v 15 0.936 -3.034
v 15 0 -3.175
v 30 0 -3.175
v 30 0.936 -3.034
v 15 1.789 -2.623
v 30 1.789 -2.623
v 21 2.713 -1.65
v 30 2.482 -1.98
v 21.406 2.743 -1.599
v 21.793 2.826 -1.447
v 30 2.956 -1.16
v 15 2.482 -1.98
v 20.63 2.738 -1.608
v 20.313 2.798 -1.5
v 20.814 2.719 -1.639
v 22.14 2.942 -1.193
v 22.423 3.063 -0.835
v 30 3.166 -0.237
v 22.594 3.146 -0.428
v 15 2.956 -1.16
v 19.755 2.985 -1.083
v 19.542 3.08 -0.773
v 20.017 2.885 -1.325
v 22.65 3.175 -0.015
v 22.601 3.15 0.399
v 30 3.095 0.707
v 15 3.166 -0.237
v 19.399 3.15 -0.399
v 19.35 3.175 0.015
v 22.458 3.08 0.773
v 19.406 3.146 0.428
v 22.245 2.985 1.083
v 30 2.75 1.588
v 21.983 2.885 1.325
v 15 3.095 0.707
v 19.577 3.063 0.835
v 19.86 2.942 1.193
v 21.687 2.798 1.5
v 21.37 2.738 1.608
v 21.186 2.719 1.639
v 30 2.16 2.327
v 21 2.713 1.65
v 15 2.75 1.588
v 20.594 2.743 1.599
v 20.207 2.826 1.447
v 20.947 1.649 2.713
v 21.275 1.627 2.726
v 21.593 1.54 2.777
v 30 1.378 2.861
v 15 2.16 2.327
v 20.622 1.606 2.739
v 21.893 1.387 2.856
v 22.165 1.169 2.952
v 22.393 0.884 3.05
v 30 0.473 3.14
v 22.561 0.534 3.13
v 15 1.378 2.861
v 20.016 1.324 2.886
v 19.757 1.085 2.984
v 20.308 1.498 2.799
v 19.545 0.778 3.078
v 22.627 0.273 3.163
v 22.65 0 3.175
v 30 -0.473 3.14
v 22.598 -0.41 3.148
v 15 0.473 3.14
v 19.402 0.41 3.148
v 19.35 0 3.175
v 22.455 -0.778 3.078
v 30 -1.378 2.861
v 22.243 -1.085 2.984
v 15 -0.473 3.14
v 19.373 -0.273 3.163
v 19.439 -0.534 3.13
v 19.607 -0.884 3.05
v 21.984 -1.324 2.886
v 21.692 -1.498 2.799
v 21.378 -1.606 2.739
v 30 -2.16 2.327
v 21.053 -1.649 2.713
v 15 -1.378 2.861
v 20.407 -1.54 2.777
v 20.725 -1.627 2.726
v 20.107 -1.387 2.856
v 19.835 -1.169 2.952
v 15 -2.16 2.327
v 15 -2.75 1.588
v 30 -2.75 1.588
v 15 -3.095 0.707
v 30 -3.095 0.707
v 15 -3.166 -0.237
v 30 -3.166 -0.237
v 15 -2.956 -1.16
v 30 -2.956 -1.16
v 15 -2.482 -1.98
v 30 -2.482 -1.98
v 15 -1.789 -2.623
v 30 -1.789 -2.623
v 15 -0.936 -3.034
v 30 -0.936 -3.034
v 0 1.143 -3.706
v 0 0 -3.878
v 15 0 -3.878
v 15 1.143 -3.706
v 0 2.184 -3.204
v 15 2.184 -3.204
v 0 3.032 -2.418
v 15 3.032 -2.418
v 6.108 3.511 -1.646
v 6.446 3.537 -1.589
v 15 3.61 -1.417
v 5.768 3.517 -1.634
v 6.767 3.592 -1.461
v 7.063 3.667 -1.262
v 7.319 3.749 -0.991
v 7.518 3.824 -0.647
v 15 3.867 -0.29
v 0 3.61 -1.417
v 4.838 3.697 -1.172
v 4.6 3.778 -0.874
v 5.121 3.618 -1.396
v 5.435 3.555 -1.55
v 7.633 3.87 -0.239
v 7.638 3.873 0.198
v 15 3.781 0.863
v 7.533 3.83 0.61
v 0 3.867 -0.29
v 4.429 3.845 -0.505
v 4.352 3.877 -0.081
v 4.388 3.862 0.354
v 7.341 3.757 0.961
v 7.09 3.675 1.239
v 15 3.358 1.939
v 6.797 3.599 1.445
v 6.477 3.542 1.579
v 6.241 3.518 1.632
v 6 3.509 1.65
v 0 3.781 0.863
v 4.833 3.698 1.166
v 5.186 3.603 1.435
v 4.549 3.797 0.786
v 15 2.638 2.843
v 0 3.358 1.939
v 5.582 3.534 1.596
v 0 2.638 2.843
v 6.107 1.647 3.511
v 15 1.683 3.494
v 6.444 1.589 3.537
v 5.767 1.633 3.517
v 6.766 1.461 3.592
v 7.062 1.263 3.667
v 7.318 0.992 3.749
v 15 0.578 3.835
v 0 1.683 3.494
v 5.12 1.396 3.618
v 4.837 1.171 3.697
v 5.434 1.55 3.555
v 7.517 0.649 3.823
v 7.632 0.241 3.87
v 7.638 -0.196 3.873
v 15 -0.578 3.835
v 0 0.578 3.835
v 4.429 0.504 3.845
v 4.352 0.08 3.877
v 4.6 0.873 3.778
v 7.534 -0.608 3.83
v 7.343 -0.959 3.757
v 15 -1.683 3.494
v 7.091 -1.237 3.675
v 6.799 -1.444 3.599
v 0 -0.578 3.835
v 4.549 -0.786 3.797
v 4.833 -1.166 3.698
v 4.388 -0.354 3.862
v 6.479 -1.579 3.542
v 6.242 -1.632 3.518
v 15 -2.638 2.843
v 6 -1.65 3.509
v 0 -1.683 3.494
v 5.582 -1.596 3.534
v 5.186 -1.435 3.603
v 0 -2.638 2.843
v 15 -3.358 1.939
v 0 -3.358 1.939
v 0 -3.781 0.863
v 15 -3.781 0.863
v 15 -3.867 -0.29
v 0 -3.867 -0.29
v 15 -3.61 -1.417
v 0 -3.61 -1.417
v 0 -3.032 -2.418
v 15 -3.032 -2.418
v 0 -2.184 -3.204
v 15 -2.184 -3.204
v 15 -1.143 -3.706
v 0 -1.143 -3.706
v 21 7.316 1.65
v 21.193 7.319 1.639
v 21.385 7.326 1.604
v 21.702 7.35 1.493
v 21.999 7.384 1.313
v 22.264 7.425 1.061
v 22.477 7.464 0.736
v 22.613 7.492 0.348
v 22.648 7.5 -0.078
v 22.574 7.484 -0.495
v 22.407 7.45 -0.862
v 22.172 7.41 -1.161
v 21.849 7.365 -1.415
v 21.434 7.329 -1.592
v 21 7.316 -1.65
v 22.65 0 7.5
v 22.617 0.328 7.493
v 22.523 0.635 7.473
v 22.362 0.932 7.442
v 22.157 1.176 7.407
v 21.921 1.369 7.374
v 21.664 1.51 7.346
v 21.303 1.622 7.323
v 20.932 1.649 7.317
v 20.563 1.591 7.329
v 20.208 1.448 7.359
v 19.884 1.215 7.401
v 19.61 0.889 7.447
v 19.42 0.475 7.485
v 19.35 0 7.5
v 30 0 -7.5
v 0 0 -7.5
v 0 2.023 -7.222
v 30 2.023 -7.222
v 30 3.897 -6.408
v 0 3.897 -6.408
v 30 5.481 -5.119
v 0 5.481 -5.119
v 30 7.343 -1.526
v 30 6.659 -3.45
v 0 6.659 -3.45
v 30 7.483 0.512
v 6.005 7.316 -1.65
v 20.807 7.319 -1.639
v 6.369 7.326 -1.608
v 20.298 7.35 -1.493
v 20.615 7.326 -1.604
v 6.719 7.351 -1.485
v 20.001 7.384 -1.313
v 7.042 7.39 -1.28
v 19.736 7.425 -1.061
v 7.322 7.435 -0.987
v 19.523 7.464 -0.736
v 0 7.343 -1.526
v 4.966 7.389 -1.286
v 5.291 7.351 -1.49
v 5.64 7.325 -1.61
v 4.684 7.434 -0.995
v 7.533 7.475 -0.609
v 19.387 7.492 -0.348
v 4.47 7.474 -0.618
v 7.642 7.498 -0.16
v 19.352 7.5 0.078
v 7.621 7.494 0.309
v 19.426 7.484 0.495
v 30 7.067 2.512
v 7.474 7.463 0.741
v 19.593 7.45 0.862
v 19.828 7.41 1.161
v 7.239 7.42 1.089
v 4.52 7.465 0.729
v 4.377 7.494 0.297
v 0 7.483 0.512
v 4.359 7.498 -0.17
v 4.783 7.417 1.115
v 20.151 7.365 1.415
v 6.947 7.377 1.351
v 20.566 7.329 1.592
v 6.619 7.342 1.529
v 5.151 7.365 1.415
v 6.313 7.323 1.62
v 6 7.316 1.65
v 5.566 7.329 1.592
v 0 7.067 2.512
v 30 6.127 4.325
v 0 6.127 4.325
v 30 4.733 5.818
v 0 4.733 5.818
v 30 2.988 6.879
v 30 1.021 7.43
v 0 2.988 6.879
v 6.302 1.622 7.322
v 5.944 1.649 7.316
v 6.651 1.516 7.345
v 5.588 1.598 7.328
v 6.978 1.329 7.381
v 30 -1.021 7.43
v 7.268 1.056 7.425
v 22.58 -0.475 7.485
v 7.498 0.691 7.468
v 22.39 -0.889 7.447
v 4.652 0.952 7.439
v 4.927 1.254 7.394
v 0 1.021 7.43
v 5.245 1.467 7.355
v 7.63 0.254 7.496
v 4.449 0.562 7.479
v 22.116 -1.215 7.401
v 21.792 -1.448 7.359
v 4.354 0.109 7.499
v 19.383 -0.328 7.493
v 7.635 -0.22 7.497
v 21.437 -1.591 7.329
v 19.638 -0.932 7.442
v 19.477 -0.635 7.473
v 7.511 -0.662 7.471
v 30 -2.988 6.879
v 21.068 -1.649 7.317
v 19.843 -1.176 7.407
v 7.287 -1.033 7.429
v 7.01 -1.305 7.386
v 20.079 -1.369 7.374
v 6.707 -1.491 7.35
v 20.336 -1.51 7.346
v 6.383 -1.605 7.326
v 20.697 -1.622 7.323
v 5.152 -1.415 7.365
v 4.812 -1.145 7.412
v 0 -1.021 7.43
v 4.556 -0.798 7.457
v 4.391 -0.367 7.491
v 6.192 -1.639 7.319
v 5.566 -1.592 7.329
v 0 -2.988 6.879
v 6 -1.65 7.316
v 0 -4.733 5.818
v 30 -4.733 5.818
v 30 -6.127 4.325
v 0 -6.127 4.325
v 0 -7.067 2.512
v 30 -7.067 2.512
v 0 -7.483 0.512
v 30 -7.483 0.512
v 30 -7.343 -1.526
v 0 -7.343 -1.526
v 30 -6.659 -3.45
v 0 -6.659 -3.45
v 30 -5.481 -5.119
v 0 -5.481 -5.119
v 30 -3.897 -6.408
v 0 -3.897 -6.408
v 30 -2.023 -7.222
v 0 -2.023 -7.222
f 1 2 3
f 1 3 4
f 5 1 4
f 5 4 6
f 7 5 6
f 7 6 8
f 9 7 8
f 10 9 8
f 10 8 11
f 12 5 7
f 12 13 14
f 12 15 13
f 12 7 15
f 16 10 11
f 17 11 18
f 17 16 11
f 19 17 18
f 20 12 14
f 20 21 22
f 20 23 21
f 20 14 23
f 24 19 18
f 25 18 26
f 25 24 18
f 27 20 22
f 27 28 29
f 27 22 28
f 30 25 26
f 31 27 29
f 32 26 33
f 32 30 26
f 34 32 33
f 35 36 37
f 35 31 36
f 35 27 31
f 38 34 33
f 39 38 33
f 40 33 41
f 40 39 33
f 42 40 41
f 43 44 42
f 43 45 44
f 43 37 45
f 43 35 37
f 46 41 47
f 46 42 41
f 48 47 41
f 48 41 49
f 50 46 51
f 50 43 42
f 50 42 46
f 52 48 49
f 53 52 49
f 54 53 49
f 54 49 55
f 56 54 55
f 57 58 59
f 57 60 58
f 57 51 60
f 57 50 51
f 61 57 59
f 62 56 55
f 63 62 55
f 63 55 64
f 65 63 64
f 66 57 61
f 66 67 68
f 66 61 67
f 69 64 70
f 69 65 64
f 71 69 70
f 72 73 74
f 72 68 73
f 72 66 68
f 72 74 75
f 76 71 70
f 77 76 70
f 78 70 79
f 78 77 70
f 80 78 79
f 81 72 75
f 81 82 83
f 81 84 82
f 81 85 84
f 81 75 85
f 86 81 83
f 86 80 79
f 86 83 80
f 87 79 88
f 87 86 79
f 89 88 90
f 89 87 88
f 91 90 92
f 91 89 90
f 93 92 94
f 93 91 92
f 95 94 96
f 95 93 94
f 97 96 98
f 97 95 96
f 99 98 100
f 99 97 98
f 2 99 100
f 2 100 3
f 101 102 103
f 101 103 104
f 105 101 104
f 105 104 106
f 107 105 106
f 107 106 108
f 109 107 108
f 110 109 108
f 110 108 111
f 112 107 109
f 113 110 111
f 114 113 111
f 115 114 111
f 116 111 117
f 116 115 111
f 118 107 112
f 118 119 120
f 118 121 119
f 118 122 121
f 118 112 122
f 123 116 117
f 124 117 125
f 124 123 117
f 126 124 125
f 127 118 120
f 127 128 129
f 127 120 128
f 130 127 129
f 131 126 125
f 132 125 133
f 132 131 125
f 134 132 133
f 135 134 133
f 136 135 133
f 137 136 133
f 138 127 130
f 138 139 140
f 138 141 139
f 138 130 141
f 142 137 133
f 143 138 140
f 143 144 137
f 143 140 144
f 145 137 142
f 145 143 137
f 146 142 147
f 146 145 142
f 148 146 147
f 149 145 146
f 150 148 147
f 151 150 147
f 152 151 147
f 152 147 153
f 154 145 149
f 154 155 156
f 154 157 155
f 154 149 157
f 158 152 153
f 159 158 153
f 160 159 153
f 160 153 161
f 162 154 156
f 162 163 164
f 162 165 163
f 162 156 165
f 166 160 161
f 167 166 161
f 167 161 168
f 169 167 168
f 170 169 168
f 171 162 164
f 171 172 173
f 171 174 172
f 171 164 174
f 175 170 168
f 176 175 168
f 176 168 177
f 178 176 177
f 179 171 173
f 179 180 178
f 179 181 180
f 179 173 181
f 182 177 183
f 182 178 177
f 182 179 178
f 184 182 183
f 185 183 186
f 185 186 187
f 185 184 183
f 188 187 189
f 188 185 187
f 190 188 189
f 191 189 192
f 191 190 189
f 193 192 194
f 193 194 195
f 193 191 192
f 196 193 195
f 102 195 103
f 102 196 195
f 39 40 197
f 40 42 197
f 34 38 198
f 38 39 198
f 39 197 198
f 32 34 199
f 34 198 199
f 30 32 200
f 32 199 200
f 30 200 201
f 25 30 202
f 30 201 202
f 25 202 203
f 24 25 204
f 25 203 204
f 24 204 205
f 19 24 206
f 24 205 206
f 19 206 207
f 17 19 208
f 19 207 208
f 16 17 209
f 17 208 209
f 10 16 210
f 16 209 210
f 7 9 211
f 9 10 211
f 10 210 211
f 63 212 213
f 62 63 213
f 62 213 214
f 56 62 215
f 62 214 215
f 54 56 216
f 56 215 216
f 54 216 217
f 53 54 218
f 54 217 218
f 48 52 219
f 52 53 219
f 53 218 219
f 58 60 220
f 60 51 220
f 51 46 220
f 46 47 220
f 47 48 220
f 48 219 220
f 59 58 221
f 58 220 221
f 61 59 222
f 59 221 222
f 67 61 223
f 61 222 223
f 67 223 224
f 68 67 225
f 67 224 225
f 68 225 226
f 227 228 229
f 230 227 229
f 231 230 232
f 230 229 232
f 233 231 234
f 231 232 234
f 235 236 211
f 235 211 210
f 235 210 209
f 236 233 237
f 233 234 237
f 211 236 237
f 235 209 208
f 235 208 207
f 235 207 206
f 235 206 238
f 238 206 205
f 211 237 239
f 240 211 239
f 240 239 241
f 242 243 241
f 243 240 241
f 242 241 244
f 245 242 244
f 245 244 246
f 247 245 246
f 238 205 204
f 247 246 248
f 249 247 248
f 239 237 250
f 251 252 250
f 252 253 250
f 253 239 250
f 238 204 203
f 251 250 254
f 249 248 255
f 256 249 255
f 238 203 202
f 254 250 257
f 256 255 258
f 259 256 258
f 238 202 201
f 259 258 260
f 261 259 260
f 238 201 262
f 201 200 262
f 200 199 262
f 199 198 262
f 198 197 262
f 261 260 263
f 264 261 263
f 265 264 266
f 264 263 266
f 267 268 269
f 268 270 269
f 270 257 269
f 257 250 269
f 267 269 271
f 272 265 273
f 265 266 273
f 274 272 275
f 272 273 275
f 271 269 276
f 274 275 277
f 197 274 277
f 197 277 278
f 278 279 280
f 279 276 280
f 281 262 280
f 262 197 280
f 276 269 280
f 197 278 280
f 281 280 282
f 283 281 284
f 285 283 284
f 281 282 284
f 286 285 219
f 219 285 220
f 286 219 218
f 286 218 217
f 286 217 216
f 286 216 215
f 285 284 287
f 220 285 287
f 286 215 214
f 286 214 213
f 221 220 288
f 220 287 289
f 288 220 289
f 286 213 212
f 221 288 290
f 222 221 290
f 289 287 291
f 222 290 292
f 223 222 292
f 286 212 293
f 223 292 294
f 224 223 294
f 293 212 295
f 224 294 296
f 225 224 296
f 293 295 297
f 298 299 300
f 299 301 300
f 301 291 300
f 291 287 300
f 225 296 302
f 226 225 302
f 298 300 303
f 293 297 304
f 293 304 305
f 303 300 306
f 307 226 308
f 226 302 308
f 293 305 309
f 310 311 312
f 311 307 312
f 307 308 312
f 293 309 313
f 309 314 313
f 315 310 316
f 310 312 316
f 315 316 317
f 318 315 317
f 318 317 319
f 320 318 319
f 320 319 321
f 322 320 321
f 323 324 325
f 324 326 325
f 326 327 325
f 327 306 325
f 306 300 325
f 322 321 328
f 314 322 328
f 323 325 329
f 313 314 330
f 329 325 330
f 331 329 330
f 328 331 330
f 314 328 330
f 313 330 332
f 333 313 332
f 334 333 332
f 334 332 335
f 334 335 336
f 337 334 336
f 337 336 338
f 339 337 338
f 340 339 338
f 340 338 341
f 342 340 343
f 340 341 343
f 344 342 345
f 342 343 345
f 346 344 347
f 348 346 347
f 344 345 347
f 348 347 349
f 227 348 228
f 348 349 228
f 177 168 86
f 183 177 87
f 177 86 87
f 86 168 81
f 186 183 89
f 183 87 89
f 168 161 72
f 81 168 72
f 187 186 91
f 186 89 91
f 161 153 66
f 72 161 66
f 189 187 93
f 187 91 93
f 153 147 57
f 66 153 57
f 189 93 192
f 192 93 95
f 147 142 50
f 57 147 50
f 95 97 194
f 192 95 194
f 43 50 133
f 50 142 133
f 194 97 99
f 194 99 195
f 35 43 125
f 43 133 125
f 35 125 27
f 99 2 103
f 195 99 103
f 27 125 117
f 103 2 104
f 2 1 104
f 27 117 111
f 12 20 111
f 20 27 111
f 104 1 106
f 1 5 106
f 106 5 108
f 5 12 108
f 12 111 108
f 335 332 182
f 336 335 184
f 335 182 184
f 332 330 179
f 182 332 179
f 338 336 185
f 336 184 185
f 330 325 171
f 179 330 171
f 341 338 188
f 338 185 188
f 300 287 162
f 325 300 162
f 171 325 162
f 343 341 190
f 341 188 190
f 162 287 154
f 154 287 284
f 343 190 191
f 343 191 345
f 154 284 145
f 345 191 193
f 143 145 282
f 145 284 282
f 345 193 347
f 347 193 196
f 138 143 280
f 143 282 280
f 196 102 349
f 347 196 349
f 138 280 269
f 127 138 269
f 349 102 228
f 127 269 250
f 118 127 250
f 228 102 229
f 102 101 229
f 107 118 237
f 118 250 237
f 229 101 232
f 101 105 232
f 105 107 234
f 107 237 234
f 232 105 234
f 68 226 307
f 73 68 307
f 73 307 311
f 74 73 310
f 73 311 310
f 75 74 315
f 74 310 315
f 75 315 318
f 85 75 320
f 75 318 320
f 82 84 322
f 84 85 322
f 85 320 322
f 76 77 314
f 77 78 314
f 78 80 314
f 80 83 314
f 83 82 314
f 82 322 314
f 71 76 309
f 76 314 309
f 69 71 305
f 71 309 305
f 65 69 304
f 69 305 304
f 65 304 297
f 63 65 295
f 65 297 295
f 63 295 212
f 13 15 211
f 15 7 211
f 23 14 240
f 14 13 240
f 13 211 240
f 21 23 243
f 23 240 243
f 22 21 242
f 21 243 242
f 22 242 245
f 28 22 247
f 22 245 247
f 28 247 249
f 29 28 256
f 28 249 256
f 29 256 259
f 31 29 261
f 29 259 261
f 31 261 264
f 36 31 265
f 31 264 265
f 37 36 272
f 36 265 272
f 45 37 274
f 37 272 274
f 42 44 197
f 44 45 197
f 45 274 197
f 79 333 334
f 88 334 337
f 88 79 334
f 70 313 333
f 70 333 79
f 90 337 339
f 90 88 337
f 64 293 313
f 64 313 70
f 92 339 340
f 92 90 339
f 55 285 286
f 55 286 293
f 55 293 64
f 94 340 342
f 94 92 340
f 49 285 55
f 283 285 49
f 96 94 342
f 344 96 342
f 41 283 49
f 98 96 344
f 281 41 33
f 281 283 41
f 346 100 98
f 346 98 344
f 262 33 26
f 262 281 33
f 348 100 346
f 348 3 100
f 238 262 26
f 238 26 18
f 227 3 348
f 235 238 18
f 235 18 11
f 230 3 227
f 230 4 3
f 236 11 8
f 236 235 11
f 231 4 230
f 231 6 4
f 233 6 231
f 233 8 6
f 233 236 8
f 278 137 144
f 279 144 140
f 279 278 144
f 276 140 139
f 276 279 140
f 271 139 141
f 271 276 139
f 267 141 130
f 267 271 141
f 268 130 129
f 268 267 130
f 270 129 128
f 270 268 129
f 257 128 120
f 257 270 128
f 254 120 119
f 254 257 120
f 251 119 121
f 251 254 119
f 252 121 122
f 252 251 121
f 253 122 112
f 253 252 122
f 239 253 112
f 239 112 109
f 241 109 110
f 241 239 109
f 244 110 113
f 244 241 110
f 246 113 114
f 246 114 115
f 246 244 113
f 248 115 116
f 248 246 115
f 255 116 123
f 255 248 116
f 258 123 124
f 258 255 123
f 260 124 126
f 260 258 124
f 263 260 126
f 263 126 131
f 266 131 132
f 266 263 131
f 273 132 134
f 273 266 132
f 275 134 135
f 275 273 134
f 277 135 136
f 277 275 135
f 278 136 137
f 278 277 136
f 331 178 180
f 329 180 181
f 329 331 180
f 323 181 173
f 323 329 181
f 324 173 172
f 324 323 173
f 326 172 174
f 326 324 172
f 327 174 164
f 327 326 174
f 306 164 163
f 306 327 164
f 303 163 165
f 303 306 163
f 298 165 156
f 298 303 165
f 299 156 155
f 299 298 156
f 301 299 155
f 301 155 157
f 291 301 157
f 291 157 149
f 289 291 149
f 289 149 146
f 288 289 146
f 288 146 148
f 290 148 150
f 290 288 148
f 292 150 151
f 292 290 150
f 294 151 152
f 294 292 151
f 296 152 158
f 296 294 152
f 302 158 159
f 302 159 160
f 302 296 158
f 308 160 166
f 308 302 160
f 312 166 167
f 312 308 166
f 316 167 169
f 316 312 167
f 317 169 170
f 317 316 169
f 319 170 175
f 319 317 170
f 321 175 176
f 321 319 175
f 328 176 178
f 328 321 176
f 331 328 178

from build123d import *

# Parameters (mm, degrees)
CROQUIS1_R              = 7.5
CROQUIS1_R_2            = 3.877864762
SALIENTE_EXTRUIR1_DEPTH = 15
CROQUIS3_R              = 7.5
CROQUIS3_R_2            = 3.175
SALIENTE_EXTRUIR2_DEPTH = 15


with BuildPart() as part:
    # Croquis1 → Saliente-Extruir1 (new body)
    with BuildSketch(Plane(origin=(0, 0, 0), x_dir=(0, 0, -1), z_dir=(1, 0, 0))):
        Circle(CROQUIS1_R)
        Circle(CROQUIS1_R_2, mode=Mode.SUBTRACT)
    extrude(amount=SALIENTE_EXTRUIR1_DEPTH)

    # Croquis3 → Saliente-Extruir2 (add)
    with BuildSketch(Plane(origin=(15, 0, 0), x_dir=(0, 0, -1), z_dir=(1, 0, 0))):
        Circle(CROQUIS3_R)
        Circle(CROQUIS3_R_2, mode=Mode.SUBTRACT)
    extrude(amount=SALIENTE_EXTRUIR2_DEPTH)

    # Croquis5 → Perforador para roscar para macho de roscar para M4x0.72 (revolve, cut)
    with BuildSketch(Plane(origin=(6, 7.5, 0), x_dir=(0, 0, 1), z_dir=(1, 0, 0))):
        Polygon((0, 0), (0, 8.491420021), (1.65, 7.5), (1.65, 0), align=None)
    revolve(axis=Axis((6, 13.85, 0), (0, -1, 0)), mode=Mode.SUBTRACT)

    # Croquis5 at point 2 (carried to point 2, square into its face) → Perforador para roscar para macho de 2 (revolve, cut)
    with BuildSketch(Plane(origin=(6, 0, 7.5), x_dir=(0, -1, 0), z_dir=(1, 0, 0))):
        Polygon((0, 0), (0, 8.491420021), (1.65, 7.5), (1.65, 0), align=None)
    revolve(axis=Axis((6, 0, 13.85), (0, 0, -1)), mode=Mode.SUBTRACT)

    # Croquis5 at point 3 (carried to point 3, square into its face) → Perforador para roscar para macho de 3 (revolve, cut)
    with BuildSketch(Plane(origin=(-116.474048572, 0, -29.182020138), x_dir=(0, 0, 1), z_dir=(1, 0, 0))):
        Polygon((0, 0), (0, 8.491420021), (1.65, 7.5), (1.65, 0), align=None)
    revolve(axis=Axis((-116.474048572, 6.35, -29.182020138), (0, -1, 0)), mode=Mode.SUBTRACT)

    # MatrizL1: read off the stored shape, not the designer's step
    # MatrizL1: loft between two sections, ruled curve by curve
    matrizl1_from = [
        Edge.make_three_point_arc((22.65, 0, 2.712370176), (21, 1.65, 2.712370176), (19.35, 0, 2.712370176)),
        Edge.make_three_point_arc((19.35, 0, 2.712370176), (21, -1.65, 2.712370176), (22.65, 0, 2.712370176)),
    ]
    matrizl1_to = [
        Edge.make_three_point_arc((22.65, 0, 7.500099893), (21, 1.65, 7.500099893), (19.35, 0, 7.500099893)),
        Edge.make_three_point_arc((19.35, 0, 7.500099893), (21, -1.65, 7.500099893), (22.65, 0, 7.500099893)),
    ]
    matrizl1 = Solid(Shell([*[Face.make_surface_from_curves(matrizl1_from[k], matrizl1_to[k]) for k in range(2)], Face(Wire(matrizl1_from)), Face(Wire(matrizl1_to))]))
    add(matrizl1, mode=Mode.SUBTRACT)

    # MatrizL1 2: loft between two sections, ruled curve by curve
    matrizl1_2_from = [
        Edge.make_three_point_arc((21, 2.712383518, 1.65), (22.65, 2.712383518, 0), (21, 2.712383518, -1.65)),
        Edge.make_three_point_arc((21, 2.712383518, -1.65), (19.35, 2.712383518, 0), (21, 2.712383518, 1.65)),
    ]
    matrizl1_2_to = [
        Edge.make_three_point_arc((21, 7.50002686, 1.65), (22.65, 7.50002686, 0), (21, 7.50002686, -1.65)),
        Edge.make_three_point_arc((21, 7.50002686, -1.65), (19.35, 7.50002686, 0), (21, 7.50002686, 1.65)),
    ]
    matrizl1_2 = Solid(Shell([*[Face.make_surface_from_curves(matrizl1_2_from[k], matrizl1_2_to[k]) for k in range(2)], Face(Wire(matrizl1_2_from)), Face(Wire(matrizl1_2_to))]))
    add(matrizl1_2, mode=Mode.SUBTRACT)


solid = part.part
